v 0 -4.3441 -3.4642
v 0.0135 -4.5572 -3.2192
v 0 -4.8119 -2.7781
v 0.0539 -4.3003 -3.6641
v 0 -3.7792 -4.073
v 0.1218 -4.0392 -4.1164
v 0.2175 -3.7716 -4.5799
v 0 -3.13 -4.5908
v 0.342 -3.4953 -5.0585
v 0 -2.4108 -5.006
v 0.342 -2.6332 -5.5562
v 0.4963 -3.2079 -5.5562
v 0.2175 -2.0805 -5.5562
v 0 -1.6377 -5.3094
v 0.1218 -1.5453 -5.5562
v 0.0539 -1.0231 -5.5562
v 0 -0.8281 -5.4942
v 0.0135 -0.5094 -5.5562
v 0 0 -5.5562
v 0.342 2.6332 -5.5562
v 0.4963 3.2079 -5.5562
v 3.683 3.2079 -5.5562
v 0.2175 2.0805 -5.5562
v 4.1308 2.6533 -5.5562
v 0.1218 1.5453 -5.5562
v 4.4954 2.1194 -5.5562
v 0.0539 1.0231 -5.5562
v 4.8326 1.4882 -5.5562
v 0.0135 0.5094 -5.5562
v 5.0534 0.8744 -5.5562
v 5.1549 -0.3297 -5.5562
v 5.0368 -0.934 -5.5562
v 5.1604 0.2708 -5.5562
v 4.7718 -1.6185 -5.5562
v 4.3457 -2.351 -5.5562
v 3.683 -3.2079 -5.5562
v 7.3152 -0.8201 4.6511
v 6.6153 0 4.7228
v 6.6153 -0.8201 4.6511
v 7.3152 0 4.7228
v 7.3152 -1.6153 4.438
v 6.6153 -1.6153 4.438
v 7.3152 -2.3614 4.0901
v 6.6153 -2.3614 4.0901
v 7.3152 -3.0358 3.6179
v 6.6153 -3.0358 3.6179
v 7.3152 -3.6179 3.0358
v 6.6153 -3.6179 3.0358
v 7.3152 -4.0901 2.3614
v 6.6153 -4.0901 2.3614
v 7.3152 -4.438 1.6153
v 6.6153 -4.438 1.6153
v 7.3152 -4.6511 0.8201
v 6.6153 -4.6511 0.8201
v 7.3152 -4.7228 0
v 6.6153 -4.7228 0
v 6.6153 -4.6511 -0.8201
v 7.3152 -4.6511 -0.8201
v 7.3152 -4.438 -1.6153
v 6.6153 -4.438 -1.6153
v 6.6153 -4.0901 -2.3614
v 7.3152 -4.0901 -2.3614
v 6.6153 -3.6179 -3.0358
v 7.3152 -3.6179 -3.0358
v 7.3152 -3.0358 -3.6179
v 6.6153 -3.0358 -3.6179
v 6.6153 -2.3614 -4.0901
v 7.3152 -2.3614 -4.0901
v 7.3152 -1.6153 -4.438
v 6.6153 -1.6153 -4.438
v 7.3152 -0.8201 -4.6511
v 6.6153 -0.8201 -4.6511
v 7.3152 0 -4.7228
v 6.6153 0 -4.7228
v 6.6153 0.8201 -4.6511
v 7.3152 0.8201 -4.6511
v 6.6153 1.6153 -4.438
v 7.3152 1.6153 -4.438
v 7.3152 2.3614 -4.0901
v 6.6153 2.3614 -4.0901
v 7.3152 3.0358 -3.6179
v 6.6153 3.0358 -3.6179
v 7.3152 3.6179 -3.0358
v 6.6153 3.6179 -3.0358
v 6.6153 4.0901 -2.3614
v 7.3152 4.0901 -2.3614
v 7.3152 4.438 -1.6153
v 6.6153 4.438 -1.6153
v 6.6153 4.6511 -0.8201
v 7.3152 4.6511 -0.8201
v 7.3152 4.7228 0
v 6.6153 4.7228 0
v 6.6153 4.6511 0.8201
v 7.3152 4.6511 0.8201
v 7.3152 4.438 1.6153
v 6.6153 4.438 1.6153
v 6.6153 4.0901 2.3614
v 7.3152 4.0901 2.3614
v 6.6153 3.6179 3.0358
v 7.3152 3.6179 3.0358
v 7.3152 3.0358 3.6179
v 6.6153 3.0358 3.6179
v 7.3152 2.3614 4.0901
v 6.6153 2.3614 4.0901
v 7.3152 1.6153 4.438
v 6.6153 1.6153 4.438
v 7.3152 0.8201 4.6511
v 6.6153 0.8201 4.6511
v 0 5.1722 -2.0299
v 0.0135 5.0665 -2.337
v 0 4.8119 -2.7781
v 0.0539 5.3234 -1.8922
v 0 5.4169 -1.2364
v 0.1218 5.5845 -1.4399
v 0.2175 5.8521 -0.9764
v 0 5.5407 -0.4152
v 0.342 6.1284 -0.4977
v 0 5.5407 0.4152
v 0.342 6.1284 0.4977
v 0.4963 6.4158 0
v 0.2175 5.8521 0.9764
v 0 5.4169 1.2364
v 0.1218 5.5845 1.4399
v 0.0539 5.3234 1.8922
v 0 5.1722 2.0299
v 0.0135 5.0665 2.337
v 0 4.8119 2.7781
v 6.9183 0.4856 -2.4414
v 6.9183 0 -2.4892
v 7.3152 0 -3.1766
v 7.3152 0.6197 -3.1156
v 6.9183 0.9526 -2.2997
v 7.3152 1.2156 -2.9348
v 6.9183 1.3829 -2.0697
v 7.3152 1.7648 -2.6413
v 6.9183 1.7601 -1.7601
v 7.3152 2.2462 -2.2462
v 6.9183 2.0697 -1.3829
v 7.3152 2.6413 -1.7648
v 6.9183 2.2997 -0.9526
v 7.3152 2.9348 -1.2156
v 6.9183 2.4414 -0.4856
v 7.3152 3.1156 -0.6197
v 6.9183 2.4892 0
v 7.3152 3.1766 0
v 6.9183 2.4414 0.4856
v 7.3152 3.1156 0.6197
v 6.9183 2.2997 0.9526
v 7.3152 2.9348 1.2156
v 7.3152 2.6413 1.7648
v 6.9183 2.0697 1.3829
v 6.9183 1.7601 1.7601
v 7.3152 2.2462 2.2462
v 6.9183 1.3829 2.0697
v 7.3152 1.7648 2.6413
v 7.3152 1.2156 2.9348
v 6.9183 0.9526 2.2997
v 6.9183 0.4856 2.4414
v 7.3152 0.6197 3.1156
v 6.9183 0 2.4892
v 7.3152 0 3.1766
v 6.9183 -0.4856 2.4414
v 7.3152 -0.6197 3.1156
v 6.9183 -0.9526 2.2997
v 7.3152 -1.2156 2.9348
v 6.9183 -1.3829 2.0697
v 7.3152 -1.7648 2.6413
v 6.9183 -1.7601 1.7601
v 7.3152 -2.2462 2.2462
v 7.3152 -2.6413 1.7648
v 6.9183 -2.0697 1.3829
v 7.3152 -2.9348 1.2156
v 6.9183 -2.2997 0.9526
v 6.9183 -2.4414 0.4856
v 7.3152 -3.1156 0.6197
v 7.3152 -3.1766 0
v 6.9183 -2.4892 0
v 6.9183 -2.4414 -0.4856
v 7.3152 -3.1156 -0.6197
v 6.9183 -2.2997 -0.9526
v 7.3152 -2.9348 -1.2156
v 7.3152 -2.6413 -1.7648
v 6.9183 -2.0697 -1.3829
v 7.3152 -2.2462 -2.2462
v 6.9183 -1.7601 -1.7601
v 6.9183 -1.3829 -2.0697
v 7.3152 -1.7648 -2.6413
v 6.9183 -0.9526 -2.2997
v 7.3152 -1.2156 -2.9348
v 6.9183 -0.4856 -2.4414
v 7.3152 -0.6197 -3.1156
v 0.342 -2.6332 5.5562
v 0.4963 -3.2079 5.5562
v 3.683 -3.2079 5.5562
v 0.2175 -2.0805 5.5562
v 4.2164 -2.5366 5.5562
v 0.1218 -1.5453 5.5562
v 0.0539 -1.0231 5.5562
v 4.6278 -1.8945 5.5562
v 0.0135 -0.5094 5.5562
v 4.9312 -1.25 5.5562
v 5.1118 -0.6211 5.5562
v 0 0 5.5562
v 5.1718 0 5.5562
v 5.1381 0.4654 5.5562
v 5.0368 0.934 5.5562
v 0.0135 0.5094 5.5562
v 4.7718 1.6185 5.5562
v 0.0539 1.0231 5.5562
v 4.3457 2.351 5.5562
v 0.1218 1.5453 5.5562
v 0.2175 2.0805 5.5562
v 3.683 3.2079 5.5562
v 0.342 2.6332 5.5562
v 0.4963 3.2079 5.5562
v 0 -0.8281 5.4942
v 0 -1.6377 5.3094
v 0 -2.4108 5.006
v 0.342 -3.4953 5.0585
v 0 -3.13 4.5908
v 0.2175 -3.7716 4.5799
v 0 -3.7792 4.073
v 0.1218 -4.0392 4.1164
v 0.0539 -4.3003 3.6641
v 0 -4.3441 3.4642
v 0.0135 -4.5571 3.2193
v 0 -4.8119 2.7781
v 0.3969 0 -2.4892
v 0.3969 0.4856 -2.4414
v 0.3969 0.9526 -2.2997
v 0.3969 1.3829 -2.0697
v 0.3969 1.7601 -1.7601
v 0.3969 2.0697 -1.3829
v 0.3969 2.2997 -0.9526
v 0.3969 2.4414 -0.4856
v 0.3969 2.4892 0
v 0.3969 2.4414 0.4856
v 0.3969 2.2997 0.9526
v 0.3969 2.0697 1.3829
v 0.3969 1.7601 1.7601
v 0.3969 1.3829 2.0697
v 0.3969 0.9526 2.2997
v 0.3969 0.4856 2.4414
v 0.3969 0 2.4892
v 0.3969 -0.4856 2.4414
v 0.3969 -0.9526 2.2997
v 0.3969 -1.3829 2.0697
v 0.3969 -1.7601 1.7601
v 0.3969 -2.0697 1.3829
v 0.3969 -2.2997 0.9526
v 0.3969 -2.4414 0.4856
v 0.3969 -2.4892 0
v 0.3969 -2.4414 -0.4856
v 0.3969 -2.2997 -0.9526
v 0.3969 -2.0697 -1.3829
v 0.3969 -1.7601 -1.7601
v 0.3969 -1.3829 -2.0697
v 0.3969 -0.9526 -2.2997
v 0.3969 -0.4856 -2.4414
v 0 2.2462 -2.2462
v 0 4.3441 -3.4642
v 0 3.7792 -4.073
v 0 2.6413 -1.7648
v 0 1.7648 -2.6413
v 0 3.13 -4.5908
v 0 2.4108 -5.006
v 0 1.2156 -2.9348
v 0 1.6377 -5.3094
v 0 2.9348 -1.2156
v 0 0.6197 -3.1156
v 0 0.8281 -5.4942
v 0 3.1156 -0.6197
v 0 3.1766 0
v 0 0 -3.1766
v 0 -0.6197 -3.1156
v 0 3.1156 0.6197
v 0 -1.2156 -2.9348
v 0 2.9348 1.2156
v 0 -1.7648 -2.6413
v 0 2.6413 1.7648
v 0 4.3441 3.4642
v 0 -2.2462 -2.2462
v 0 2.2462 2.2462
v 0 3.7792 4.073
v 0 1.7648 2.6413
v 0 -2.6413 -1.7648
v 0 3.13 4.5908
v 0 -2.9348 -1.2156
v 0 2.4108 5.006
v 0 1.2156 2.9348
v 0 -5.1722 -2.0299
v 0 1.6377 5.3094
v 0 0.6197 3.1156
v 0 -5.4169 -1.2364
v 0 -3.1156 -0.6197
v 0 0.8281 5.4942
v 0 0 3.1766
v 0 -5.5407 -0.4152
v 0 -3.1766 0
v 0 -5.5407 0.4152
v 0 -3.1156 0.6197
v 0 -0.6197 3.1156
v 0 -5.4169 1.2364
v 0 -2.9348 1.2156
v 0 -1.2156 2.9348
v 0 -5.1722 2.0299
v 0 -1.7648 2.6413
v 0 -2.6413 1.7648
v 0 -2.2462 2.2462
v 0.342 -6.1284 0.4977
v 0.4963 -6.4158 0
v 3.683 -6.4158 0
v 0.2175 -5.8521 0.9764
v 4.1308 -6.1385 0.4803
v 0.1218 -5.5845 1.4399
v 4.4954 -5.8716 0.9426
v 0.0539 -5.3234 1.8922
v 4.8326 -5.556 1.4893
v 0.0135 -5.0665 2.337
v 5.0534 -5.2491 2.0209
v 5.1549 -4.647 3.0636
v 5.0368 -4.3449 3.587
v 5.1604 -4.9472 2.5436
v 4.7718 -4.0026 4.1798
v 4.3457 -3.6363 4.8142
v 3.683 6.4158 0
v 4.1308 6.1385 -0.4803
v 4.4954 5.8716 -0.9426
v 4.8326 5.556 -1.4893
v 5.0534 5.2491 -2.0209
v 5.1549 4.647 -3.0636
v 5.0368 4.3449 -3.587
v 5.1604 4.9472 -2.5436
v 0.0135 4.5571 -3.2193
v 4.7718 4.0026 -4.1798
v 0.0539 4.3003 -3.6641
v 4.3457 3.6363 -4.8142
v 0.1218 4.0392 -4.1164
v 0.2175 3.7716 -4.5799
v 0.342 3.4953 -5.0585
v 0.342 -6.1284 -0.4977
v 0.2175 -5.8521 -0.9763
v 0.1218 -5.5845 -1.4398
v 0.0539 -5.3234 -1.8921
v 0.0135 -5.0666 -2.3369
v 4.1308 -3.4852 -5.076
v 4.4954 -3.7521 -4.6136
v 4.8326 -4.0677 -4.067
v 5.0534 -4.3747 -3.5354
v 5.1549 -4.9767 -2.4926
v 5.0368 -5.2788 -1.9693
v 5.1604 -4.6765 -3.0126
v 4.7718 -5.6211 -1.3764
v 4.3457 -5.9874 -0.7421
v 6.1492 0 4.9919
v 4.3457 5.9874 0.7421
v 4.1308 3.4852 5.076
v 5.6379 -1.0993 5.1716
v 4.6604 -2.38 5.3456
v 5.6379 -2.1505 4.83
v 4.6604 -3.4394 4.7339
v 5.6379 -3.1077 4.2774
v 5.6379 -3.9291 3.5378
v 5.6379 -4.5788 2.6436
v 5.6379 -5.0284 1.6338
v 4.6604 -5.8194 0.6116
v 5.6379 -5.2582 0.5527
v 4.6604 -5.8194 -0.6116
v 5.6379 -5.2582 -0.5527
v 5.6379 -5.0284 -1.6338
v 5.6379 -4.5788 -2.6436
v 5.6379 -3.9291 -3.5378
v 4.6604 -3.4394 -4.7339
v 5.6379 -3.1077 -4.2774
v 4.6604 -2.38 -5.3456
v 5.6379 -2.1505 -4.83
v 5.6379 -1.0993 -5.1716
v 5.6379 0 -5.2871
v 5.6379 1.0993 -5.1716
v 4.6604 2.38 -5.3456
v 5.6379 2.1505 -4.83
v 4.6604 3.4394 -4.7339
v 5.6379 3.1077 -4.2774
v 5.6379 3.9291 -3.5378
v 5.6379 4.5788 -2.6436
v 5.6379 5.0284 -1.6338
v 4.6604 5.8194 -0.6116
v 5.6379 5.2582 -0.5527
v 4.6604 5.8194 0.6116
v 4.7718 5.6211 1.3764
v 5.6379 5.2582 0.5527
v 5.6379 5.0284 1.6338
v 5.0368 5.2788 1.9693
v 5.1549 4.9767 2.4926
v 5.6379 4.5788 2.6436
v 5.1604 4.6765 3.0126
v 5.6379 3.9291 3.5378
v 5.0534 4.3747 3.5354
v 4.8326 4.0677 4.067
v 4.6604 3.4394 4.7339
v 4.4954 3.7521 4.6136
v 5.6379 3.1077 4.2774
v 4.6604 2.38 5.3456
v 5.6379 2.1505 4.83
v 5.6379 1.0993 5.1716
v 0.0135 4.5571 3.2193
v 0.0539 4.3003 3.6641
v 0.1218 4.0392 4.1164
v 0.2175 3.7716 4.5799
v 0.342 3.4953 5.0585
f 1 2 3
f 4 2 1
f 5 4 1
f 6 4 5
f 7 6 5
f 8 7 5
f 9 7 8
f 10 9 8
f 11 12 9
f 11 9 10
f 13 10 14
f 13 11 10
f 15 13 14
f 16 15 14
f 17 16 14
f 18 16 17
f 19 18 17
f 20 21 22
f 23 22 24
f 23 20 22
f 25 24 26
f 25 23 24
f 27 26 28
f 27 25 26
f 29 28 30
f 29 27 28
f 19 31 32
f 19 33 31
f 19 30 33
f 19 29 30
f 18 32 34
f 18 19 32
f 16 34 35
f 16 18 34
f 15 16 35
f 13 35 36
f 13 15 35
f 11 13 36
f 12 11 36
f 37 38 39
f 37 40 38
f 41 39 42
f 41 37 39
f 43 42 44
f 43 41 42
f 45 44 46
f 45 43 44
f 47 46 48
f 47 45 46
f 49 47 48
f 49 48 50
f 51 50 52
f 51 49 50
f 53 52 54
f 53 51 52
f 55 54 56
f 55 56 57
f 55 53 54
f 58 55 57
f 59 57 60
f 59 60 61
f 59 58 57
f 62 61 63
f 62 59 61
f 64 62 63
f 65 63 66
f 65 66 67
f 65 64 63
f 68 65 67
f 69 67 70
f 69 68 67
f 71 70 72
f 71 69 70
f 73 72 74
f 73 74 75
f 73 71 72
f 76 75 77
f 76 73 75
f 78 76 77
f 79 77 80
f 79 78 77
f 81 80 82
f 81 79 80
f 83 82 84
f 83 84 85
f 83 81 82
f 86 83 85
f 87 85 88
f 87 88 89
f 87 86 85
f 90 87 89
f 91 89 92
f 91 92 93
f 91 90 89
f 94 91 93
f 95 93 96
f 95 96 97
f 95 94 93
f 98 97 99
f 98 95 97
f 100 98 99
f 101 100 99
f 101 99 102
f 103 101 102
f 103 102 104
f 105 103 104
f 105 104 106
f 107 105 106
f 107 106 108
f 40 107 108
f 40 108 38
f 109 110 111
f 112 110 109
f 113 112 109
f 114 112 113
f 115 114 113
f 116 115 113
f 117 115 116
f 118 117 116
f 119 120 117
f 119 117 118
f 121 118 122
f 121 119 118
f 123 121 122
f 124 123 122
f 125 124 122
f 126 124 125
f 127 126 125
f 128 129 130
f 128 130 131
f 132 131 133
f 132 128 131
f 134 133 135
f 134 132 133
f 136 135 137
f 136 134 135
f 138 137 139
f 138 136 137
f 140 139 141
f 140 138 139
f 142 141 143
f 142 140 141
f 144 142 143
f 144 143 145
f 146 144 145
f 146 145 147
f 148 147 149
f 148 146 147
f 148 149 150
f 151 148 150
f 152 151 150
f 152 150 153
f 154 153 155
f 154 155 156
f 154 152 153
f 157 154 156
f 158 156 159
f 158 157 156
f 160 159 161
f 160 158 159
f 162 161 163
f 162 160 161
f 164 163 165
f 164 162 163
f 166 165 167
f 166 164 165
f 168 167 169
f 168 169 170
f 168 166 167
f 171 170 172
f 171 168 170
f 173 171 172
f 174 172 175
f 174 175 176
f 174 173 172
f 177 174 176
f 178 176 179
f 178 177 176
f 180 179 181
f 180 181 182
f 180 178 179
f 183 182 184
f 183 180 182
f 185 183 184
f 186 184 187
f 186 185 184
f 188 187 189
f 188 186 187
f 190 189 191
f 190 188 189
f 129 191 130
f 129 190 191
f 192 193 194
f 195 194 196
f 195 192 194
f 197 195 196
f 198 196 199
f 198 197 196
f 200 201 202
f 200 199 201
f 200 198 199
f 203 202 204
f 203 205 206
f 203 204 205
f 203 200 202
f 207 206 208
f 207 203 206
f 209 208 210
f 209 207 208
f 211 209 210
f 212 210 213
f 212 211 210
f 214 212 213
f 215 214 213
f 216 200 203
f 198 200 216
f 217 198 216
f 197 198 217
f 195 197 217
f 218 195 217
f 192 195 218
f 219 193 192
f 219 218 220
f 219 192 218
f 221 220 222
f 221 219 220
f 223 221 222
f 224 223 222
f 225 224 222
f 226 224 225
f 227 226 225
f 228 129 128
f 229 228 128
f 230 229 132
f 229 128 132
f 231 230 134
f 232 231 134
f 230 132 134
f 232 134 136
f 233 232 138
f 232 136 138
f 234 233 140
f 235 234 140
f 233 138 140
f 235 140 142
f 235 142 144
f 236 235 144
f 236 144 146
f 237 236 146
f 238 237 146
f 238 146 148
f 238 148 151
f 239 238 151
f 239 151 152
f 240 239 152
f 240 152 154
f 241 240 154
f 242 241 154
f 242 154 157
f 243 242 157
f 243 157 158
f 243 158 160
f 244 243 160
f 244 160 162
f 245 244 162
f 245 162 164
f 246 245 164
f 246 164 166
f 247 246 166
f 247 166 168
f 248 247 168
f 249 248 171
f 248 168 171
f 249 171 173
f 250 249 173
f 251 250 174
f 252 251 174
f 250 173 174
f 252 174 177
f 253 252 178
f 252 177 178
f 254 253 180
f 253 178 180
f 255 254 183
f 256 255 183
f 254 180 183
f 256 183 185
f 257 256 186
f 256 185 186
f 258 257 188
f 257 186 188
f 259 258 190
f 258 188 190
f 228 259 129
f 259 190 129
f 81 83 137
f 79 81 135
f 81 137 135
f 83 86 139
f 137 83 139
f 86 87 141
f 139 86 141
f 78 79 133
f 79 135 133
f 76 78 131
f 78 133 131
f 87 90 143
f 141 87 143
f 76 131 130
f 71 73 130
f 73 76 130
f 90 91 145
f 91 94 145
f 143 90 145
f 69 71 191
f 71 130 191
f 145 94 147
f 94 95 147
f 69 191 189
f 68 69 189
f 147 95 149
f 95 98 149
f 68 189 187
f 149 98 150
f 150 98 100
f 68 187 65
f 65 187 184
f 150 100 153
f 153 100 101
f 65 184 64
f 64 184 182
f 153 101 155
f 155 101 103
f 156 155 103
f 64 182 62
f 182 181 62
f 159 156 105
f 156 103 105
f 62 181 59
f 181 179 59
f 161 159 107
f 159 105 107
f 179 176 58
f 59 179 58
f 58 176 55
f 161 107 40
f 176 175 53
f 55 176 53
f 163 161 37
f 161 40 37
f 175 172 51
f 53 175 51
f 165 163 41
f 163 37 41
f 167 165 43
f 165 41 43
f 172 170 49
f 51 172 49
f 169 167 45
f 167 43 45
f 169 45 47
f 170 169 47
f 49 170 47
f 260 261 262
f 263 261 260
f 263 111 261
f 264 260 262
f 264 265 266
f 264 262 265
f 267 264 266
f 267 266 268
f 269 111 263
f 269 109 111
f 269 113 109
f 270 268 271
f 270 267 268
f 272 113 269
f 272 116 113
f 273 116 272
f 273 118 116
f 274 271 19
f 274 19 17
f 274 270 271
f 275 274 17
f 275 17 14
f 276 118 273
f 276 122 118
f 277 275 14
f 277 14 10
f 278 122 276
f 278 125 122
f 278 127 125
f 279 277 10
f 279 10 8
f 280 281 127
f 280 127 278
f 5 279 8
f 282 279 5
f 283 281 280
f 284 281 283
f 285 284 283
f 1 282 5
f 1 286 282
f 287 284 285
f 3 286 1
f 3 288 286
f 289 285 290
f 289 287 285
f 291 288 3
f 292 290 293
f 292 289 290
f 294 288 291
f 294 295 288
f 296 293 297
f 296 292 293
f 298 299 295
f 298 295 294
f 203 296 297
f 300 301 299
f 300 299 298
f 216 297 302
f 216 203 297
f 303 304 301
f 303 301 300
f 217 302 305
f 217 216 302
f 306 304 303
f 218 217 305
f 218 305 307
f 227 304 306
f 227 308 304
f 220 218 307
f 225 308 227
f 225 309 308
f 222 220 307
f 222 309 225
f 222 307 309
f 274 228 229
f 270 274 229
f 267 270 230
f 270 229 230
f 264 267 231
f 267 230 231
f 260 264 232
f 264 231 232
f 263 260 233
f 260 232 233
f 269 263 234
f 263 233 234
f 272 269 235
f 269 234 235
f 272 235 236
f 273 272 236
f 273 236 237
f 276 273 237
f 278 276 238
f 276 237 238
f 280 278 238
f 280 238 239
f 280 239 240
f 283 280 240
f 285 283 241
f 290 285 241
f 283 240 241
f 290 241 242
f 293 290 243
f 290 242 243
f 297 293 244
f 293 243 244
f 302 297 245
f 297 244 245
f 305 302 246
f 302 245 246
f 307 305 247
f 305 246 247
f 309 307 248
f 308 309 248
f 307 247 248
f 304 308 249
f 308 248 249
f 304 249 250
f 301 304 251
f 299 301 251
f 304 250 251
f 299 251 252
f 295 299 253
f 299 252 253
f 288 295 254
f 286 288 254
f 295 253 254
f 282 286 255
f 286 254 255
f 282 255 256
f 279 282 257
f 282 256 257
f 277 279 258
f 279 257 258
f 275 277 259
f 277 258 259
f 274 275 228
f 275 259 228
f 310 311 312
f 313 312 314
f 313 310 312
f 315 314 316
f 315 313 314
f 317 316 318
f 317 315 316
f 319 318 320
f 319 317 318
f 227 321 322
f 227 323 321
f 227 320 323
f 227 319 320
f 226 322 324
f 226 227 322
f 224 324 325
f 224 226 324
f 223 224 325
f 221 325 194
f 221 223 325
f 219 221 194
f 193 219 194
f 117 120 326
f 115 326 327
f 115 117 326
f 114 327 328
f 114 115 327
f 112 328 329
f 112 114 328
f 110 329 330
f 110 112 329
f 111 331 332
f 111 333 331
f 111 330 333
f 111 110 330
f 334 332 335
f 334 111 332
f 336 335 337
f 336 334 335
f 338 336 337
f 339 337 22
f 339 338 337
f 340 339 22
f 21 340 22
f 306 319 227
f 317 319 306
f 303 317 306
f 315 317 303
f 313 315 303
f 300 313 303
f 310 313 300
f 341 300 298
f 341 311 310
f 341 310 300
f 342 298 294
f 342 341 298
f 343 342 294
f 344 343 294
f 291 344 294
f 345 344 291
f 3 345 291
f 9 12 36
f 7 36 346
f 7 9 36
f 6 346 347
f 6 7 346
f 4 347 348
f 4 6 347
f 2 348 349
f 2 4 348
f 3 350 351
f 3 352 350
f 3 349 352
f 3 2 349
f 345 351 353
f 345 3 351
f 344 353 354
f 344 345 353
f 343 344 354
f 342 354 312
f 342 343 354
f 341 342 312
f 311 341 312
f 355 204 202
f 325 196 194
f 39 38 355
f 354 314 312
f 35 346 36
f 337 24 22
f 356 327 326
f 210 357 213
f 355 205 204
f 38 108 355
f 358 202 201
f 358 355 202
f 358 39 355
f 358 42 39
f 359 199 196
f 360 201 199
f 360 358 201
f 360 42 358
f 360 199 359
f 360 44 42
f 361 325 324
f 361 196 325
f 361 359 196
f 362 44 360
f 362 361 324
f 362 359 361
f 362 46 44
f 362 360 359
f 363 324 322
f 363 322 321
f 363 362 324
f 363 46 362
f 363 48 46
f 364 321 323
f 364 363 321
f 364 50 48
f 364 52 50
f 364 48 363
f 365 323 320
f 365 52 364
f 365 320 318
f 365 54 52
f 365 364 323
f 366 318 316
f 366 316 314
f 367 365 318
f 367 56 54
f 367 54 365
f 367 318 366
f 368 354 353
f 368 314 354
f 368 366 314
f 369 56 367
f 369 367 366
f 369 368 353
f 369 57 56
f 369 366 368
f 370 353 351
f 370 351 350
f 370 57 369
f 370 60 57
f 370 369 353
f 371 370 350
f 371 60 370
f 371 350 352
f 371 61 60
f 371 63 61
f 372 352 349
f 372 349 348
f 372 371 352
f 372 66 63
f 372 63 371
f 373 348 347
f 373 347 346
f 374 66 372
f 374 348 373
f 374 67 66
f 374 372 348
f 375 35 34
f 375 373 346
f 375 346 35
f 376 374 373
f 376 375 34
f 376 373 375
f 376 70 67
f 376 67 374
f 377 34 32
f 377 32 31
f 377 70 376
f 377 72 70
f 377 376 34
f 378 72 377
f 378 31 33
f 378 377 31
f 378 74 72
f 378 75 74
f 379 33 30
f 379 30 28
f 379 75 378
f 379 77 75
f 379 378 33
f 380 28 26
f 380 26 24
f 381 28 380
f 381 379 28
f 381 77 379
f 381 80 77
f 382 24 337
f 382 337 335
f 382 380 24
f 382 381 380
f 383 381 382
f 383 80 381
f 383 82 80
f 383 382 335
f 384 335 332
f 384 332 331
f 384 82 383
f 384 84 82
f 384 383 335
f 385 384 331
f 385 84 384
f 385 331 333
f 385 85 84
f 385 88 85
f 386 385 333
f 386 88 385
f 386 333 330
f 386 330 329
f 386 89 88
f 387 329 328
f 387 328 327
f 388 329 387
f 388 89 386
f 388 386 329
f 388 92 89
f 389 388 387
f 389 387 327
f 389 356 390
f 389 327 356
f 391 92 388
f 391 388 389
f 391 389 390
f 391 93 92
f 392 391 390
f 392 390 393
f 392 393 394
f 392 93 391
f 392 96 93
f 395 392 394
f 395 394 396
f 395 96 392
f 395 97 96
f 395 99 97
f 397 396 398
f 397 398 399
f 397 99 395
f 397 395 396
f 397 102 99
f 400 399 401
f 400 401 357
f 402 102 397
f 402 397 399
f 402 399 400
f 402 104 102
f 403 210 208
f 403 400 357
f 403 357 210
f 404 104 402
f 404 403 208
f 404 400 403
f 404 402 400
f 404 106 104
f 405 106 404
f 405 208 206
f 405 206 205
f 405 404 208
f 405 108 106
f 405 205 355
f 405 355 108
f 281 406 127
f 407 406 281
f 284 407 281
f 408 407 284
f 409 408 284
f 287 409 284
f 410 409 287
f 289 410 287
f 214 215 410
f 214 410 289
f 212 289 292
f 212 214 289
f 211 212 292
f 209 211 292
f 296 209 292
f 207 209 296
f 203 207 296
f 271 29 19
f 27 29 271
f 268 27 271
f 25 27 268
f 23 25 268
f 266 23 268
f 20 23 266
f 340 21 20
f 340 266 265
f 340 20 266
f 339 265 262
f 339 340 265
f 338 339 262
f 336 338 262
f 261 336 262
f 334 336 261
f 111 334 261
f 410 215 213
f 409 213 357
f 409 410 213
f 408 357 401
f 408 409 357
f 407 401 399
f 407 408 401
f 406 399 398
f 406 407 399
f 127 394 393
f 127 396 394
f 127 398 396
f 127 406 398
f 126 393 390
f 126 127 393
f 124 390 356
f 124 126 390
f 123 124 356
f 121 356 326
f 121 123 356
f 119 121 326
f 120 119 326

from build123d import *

# Parameters (mm, degrees)
BODY_DEPTH     = 7.3152
THREAD_D       = 4.9784
CHAMFER1_SIZE  = 0.687407664
CHAMFER1_SIZE2 = 0.396875
CHAMFER2_SIZE  = 0.687407664
CHAMFER2_SIZE2 = 0.396875


with BuildPart() as part:
    # Sketch1 → Body (new body)
    with BuildSketch(Plane.YZ):
        Polygon((-6.415804866, 0), (-3.207902433, 5.55625), (3.207902433, 5.55625), (6.415804866, 0), (3.207902433, -5.55625), (-3.207902433, -5.55625), align=None)
    extrude(amount=BODY_DEPTH)

    # Thread (through all)
    with Locations(Plane.ZY):
        with Locations((0, 0)):
            Hole(THREAD_D / 2)

    # Chamfer1
    chamfer1_edges = [part.edges().sort_by_distance(p)[0] for p in [
        (0, 0, 2.4892),
    ]]
    chamfer1_side = [part.faces().sort_by_distance(p)[0] for p in [
        (0, -4.664849093, 2.693251879),
    ]]
    chamfer(chamfer1_edges, length=CHAMFER1_SIZE, length2=CHAMFER1_SIZE2, reference=chamfer1_side[0])

    # Chamfer2
    chamfer2_edges = [part.edges().sort_by_distance(p)[0] for p in [
        (7.3152, 0, 2.4892),
    ]]
    chamfer2_side = [part.faces().sort_by_distance(p)[0] for p in [
        (7.3152, -4.664849093, 2.693251879),
    ]]
    chamfer(chamfer2_edges, length=CHAMFER2_SIZE, length2=CHAMFER2_SIZE2, reference=chamfer2_side[0])

    # Sketch4 → Chamfer3 (revolve, cut)
    with BuildSketch(Plane.XY, mode=Mode.PRIVATE) as chamfer3_sk:
        Polygon((0, 5.55625), (0.496264233, 6.415804866), (0, 6.415804866), align=None)
        Polygon((7.3152, 4.7228125), (7.3152, 6.415804866), (3.683, 6.415804866), (6.615348795, 4.7228125), align=None)
    revolve(chamfer3_sk.sketch.rotate(Axis((-1.46304, 0, 0), (1, 0, 0)), 90), axis=Axis((-1.46304, 0, 0), (1, 0, 0)), mode=Mode.SUBTRACT)


solid = part.part
